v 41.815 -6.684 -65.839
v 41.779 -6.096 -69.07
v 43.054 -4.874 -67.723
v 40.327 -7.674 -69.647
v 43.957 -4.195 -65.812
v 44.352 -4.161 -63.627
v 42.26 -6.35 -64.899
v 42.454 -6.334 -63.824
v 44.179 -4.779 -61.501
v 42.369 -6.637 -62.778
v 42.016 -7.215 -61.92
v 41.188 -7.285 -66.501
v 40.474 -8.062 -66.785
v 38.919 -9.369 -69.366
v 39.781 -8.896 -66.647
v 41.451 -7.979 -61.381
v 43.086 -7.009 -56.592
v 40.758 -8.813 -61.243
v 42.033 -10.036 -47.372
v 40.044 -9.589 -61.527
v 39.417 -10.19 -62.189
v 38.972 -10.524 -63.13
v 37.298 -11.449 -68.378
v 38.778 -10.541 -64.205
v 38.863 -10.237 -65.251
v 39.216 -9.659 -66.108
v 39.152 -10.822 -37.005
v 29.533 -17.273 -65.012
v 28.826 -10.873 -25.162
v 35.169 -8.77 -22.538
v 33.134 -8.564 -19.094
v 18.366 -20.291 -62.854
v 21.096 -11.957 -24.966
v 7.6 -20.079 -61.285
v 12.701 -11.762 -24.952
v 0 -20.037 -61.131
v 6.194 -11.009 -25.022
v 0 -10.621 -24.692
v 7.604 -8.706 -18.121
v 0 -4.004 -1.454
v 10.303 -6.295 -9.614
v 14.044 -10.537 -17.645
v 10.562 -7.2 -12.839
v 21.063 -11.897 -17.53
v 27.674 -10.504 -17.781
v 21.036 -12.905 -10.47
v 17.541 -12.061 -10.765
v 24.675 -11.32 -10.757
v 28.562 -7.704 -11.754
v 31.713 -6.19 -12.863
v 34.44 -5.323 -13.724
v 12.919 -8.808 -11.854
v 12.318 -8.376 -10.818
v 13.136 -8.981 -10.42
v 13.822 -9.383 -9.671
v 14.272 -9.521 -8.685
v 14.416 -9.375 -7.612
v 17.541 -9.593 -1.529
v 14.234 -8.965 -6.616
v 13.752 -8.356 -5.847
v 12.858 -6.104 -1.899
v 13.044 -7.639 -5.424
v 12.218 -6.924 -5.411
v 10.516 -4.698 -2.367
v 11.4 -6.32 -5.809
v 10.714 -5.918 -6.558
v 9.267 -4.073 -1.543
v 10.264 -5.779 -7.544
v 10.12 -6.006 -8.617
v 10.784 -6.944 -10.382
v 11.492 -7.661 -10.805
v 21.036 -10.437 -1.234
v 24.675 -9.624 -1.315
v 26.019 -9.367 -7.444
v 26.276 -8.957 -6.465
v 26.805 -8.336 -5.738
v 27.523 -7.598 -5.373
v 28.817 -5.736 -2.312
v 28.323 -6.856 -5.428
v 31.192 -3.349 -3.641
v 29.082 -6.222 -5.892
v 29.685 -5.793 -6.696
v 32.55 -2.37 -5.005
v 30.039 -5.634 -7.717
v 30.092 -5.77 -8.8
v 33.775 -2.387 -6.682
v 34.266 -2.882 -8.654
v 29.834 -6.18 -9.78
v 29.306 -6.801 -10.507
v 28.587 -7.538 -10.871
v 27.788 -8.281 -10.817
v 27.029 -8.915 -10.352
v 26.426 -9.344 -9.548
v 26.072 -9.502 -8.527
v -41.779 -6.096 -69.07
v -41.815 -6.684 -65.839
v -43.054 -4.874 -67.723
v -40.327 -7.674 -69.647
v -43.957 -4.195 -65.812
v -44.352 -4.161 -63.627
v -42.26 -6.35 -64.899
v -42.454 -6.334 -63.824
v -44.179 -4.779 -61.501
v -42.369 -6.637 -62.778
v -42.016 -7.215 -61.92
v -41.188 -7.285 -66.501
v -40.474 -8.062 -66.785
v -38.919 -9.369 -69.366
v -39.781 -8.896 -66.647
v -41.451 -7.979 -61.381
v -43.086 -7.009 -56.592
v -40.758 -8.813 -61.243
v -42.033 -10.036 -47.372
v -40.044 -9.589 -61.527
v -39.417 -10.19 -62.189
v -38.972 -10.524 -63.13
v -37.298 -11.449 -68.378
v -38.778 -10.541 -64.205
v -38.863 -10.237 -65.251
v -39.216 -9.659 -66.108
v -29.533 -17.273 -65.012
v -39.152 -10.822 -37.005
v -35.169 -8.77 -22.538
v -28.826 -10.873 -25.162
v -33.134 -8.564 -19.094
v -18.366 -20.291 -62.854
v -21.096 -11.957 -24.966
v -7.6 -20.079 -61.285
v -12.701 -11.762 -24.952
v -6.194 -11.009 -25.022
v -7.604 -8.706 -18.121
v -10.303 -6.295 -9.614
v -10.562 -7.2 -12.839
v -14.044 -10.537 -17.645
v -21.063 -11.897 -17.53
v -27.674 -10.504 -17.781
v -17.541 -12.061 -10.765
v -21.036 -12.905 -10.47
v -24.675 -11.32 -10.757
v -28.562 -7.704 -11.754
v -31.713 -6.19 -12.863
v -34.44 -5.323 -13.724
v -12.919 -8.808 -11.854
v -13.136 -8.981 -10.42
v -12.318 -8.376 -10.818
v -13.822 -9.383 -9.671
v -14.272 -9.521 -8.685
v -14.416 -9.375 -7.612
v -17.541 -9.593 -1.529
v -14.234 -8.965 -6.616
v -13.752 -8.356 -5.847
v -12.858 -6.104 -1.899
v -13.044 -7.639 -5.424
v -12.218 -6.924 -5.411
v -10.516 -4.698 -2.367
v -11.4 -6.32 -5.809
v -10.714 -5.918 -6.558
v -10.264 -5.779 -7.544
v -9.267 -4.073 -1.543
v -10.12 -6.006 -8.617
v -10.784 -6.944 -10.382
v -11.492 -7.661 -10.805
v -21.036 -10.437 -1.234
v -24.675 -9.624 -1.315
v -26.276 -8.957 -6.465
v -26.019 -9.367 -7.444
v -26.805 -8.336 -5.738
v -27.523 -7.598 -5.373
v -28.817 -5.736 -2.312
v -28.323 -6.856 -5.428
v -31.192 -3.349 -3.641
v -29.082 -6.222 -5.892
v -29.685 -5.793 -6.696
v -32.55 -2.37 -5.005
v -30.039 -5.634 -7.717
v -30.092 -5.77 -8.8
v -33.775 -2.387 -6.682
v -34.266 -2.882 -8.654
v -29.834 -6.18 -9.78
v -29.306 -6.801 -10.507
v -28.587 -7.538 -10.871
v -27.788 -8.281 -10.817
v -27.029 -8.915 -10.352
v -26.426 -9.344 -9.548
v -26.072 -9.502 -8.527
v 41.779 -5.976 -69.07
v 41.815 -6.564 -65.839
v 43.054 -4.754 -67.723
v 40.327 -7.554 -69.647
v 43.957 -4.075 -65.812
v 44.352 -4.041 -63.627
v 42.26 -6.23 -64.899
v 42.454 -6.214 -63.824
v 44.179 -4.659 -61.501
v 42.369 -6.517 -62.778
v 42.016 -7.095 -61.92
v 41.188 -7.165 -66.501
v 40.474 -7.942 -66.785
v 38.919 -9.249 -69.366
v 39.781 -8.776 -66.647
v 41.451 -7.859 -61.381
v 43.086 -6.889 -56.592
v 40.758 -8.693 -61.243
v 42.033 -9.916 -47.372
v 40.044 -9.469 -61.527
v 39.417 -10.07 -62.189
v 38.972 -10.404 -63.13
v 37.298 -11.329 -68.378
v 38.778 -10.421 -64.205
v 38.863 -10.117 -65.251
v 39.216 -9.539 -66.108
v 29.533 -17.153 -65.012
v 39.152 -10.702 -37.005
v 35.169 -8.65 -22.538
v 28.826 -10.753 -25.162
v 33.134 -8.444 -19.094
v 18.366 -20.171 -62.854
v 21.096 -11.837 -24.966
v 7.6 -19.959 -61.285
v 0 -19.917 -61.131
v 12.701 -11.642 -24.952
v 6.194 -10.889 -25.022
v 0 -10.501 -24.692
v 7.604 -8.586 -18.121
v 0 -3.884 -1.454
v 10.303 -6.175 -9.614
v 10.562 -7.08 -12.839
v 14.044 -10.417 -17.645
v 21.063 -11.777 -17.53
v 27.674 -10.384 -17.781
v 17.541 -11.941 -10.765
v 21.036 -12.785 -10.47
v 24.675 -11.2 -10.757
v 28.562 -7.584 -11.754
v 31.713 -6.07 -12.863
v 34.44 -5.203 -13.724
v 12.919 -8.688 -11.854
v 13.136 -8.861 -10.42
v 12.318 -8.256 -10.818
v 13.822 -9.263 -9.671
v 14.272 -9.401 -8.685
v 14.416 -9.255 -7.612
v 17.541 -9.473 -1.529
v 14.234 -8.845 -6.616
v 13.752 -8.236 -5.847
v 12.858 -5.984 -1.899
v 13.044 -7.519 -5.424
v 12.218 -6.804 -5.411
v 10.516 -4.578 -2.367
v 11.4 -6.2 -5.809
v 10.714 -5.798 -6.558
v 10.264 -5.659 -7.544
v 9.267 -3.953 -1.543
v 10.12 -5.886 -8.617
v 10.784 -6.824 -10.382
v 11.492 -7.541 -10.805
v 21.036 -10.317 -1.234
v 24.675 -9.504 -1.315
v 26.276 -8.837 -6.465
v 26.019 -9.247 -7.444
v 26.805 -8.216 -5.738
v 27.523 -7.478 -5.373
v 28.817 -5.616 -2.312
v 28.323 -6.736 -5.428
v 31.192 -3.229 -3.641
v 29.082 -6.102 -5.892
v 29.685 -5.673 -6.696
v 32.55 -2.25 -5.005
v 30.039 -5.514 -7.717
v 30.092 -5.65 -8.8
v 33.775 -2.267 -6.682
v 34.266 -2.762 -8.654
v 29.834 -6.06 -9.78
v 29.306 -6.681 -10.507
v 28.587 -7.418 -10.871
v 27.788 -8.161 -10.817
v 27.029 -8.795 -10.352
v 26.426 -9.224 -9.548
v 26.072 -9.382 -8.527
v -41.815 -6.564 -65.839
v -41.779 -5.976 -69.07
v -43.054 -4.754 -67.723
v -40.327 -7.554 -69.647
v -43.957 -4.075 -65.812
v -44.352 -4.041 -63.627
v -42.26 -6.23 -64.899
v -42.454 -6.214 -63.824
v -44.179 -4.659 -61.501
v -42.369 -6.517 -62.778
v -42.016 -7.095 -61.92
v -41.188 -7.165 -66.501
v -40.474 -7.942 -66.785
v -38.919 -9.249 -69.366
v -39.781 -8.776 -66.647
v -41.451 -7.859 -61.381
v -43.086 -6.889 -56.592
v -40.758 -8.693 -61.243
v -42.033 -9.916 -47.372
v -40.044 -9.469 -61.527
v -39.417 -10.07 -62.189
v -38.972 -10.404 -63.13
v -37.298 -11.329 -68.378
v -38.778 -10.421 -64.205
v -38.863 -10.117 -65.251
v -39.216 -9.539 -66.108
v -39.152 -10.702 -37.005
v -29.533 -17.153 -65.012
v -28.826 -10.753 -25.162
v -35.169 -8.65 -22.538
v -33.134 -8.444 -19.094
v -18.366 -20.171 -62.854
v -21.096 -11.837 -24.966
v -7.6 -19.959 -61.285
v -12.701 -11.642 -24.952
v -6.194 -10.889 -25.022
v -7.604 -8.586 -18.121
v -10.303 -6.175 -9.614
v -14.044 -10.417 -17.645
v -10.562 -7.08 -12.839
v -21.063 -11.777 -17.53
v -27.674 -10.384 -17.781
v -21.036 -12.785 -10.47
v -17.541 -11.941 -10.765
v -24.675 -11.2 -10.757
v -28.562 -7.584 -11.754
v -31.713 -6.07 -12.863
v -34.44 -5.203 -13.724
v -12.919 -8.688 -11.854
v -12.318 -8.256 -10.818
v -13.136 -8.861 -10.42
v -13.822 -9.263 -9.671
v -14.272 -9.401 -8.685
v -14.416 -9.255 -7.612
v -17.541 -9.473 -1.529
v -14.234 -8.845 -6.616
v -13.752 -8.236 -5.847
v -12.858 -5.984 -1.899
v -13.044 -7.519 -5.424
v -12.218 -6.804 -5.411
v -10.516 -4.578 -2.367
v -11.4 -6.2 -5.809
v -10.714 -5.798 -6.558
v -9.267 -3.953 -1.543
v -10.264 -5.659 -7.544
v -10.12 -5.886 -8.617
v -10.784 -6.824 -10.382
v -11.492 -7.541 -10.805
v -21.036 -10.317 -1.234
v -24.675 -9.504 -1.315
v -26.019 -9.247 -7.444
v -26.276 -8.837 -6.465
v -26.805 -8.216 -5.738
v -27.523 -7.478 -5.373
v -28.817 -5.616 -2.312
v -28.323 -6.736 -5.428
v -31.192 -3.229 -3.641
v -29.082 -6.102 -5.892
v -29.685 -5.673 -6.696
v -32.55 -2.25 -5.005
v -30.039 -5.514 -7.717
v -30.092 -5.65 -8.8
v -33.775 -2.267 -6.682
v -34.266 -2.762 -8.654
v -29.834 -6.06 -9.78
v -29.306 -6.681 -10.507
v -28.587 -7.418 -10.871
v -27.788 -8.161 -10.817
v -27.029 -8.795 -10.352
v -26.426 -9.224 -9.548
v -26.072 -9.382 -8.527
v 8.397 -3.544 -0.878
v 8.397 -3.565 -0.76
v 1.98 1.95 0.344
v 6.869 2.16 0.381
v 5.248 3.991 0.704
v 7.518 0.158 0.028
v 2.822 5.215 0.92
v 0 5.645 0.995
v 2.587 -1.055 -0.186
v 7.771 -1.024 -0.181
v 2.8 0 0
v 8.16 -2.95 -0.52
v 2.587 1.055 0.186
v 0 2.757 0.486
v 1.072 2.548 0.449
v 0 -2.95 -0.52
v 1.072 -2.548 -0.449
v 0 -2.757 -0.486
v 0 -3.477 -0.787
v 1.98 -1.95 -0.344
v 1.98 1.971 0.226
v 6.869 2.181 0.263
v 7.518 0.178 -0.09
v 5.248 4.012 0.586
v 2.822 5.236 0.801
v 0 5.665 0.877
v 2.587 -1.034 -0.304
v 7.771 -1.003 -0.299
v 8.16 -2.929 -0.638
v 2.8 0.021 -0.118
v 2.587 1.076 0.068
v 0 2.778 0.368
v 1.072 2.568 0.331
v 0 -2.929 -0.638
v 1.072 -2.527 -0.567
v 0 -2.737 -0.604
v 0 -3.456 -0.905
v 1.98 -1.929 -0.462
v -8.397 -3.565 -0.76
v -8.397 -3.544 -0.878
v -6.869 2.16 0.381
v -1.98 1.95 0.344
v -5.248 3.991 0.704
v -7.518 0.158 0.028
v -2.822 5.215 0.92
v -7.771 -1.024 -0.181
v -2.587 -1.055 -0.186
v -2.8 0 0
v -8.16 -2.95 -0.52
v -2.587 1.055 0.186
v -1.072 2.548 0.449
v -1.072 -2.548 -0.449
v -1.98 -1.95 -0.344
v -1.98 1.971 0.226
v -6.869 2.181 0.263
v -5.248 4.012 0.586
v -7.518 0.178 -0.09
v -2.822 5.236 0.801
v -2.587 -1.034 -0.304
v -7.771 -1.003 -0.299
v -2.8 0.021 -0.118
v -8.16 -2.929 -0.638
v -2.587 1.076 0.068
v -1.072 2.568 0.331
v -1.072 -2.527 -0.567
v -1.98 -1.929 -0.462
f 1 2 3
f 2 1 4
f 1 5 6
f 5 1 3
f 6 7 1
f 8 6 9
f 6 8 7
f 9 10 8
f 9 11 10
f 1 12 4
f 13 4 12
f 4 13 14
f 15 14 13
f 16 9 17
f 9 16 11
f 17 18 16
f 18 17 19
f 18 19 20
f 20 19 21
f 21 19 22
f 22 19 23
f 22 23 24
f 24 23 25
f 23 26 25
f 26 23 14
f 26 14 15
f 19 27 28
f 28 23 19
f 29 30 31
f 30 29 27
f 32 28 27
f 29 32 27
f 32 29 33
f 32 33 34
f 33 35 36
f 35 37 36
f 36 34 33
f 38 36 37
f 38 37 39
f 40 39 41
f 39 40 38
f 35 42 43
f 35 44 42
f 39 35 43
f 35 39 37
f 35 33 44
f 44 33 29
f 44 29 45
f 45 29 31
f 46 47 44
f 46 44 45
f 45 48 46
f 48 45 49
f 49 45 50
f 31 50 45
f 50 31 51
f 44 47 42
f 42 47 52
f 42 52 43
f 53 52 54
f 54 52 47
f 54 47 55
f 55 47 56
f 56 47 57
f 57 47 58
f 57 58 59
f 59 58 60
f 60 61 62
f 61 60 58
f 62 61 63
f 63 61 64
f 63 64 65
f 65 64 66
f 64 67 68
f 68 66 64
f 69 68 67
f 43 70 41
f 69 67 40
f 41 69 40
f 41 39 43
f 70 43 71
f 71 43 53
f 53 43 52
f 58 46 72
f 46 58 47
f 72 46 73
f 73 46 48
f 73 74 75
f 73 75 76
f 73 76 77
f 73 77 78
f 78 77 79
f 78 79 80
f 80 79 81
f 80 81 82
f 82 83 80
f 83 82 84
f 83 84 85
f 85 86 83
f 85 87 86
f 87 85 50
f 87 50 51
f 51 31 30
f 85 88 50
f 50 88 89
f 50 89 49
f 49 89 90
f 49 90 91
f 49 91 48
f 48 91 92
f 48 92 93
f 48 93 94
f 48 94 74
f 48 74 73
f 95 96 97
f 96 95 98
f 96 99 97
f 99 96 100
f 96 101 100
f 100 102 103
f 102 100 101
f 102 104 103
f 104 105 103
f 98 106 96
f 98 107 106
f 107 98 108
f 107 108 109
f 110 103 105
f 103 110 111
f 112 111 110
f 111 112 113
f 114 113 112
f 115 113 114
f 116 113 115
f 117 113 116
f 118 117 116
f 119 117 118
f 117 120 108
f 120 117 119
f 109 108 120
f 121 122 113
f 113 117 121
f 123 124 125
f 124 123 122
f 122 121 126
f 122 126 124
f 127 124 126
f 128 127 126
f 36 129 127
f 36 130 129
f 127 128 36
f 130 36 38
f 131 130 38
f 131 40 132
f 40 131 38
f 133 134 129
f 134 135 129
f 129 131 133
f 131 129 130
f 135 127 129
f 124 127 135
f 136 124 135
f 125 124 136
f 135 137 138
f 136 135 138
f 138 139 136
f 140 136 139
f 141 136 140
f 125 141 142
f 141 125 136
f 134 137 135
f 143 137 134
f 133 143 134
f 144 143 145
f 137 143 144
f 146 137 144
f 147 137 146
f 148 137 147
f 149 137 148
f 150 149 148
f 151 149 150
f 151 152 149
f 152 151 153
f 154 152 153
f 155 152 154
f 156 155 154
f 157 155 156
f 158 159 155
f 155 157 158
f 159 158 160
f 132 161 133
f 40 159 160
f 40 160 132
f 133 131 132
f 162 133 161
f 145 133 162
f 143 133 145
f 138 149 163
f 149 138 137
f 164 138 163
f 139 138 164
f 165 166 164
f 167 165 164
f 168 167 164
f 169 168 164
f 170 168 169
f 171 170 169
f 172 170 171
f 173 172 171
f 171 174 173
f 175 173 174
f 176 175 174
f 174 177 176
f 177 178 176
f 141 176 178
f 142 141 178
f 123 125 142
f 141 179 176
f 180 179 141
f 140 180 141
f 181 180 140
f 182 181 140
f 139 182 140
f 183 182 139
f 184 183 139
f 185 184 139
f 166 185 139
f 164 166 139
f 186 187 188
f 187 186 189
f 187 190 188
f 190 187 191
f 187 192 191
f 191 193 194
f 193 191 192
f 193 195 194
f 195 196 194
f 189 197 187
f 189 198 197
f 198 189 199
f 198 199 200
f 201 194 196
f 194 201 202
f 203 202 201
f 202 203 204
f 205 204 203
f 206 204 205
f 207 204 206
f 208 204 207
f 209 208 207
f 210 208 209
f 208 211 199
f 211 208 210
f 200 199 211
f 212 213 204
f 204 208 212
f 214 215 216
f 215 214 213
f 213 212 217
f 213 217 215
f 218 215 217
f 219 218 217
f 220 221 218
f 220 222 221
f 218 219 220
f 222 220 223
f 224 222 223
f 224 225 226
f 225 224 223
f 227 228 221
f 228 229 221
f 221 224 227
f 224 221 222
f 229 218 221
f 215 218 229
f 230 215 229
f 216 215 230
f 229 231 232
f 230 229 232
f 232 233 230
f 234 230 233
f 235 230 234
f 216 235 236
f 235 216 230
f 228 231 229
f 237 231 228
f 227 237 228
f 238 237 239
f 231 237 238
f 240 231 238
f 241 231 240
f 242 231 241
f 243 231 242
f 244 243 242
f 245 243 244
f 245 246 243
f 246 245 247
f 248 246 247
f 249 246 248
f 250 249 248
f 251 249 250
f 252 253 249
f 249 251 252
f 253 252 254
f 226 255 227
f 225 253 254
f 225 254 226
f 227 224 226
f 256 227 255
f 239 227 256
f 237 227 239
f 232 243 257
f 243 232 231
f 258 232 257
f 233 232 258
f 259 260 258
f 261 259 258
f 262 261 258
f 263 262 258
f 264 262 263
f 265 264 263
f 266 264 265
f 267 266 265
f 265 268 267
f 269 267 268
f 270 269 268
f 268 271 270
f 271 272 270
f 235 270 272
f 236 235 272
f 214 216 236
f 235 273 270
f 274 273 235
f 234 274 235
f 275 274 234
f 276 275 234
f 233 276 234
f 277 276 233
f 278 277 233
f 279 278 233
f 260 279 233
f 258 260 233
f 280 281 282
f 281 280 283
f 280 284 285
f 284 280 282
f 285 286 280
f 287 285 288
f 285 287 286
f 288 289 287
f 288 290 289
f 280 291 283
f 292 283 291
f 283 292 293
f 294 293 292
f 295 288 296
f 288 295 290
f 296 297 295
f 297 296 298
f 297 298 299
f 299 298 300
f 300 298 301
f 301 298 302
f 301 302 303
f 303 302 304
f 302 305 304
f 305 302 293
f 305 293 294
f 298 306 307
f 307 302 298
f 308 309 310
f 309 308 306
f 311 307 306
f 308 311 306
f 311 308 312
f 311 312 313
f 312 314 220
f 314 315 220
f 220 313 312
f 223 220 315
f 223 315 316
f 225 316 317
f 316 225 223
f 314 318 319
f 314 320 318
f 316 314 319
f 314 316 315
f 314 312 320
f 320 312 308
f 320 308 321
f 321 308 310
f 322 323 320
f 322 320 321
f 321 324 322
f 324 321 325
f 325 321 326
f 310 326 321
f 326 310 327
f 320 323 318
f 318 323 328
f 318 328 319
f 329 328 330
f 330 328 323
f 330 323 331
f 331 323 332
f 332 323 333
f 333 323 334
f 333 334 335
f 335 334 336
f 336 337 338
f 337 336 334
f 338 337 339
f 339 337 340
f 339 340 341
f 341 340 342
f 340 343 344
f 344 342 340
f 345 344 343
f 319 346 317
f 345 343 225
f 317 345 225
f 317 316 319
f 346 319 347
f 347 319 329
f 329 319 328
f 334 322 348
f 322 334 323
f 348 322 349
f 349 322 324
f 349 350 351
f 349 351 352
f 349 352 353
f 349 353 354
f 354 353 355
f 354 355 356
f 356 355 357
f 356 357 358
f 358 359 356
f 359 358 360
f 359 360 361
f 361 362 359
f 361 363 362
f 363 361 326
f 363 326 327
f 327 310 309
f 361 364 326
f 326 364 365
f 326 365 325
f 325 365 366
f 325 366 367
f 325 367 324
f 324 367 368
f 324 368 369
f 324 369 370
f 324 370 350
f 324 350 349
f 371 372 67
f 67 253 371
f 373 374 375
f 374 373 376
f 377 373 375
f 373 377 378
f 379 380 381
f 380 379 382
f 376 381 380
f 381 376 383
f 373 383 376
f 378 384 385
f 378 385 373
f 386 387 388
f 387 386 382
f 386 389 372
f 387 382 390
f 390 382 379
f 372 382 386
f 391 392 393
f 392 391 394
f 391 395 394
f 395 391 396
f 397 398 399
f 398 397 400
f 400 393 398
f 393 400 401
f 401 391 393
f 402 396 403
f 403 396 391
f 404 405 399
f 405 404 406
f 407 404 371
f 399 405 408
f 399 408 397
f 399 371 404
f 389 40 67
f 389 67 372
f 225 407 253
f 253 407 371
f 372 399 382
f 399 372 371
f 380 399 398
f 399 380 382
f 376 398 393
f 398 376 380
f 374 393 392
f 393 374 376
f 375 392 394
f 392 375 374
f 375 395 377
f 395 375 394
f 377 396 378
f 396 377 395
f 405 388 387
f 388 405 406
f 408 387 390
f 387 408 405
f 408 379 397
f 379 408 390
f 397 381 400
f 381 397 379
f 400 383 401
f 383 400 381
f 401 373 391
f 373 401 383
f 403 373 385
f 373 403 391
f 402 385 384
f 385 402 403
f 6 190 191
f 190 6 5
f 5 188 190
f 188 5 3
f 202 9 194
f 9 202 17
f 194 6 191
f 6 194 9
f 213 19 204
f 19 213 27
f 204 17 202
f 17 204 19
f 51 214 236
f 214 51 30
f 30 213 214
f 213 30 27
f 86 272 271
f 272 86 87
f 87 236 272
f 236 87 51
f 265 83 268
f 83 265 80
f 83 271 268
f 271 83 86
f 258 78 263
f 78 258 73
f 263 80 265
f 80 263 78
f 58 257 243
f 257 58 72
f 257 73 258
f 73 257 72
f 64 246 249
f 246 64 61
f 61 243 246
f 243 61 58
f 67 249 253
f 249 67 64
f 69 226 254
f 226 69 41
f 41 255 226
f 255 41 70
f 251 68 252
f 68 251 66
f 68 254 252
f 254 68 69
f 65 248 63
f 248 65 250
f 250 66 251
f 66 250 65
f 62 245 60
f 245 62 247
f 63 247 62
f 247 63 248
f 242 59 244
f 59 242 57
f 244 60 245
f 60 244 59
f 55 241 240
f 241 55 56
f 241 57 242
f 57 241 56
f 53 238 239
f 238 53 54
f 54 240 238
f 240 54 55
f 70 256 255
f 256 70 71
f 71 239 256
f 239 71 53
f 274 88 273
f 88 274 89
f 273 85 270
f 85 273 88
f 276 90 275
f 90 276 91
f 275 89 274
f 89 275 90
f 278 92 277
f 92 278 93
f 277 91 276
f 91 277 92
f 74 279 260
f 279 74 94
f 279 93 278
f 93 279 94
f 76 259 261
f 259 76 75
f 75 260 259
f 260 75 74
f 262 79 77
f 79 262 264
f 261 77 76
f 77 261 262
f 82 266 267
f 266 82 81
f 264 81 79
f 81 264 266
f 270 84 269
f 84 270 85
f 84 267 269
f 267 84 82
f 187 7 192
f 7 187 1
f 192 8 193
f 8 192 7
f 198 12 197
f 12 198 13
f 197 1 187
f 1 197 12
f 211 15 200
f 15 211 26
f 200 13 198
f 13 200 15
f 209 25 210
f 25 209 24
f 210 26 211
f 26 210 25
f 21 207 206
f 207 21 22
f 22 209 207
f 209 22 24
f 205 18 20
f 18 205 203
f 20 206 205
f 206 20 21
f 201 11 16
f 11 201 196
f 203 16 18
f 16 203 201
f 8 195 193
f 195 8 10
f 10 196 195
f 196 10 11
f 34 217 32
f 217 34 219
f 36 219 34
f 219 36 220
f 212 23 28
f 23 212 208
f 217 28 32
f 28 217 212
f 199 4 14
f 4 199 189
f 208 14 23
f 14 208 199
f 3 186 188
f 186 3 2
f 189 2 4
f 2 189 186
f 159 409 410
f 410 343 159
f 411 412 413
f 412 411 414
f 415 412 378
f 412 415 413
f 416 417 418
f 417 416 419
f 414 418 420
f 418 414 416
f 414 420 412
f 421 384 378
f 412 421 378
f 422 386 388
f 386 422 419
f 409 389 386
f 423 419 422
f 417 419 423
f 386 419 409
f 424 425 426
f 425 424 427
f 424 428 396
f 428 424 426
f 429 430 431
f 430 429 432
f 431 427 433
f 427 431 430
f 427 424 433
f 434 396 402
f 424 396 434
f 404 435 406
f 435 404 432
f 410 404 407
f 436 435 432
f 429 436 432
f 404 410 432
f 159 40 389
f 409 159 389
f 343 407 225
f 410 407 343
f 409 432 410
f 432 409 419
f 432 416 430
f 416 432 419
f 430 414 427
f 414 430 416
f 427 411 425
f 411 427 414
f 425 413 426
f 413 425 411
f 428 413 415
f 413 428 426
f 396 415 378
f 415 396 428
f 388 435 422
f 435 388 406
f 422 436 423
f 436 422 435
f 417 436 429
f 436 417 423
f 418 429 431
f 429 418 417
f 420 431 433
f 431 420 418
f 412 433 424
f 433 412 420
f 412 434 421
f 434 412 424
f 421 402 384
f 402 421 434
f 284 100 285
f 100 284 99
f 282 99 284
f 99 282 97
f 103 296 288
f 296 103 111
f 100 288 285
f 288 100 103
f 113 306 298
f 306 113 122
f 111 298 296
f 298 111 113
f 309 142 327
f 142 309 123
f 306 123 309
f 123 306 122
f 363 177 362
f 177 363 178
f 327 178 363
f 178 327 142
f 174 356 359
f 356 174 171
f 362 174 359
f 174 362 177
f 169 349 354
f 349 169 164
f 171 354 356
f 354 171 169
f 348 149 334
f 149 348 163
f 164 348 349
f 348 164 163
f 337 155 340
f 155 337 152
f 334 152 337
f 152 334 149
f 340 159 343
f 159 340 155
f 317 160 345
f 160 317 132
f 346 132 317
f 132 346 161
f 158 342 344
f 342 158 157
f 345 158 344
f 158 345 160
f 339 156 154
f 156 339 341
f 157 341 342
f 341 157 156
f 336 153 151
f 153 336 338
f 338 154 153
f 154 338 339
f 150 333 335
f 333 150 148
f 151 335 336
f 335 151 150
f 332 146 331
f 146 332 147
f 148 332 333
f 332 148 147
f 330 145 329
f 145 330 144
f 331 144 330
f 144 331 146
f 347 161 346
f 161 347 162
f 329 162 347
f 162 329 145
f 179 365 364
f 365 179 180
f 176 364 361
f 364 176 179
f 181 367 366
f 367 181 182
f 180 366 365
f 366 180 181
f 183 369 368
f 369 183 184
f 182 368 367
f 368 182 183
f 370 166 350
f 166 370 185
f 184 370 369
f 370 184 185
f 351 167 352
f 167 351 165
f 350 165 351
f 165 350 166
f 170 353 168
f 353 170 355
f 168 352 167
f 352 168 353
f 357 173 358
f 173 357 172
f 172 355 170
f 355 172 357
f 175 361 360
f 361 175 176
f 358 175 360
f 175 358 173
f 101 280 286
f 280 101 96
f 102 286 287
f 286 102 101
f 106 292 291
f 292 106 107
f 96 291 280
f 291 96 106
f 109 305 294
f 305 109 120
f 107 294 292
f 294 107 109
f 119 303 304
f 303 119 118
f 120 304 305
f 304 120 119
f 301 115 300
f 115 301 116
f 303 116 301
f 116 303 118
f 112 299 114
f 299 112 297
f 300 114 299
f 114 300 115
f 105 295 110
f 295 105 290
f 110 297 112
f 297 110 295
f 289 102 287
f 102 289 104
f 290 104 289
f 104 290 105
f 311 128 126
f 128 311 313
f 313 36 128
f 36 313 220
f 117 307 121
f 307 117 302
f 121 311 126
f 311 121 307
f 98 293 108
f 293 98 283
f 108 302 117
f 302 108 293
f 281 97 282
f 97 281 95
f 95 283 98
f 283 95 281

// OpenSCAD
use <../lib.scad>
use <s/u767c03s01.scad>
use <s/u767c03s02.scad>
function ldraw_lib__u767c03() = [
// 0 Sail 12 x 10 Trapezoidal (Formed Shape 3)
// 0 Name: u767c03.dat
// 0 Author: Philippe Hurbain [Philo]
// 0 !LDRAW_ORG Part UPDATE 2026-05
// 0 !LICENSE Licensed under CC BY 4.0 : see CAreadme.txt
// 
// 0 !HELP Placement on mast:
// 0 !HELP 1 25 58 20 -19 0 0 1 0 -1 0 1 0 0 3849.dat
// 0 !HELP 1 25 0 362 20 1 0 0 0 1 0 0 0 1 2538d.dat
// 0 !HELP 1 25 0 146 -22 1 0 0 0 -1 0 0 0 -1 4623.dat
// 0 !HELP 1 25 -10 154 -22 0 0 -1 0 -1 0 -1 0 0 2555.dat
// 0 !HELP 1 25 -98 160 -22 0 1 0 0 0 -1 -1 0 0 4497.dat
// 0 !HELP 1 25 10 154 -22 0 0 1 0 -1 0 1 0 0 2555.dat
// 0 !HELP 1 25 98 160 -22 0 -1 0 0 0 1 -1 0 0 4497.dat
// 
// 0 BFC CERTIFY CCW
  [0,"BFC","CERTIFY"],
  [0,"BFC","CCW"],
// 
// 0 !CATEGORY Sheet Fabric
// 
// 0 !KEYWORDS set 6277
// 
// 0 !HISTORY 2026-05-31 [OrionP] Official Update 2026-05
// 
// 
// 1 16 0 0 0 1 0 0 0 1 0 0 0 1 s\u767c03s01.dat
  [1,16,0,0,0,1,0,0,0,1,0,0,0,1, ldraw_lib__s__u767c03s01()],
// 1 16 0 0 0 -1 0 0 0 1 0 0 0 1 s\u767c03s01.dat
  [1,16,0,0,0,-1,0,0,0,1,0,0,0,1, ldraw_lib__s__u767c03s01()],
// 0 BFC INVERTNEXT
  [0,"BFC","INVERTNEXT"],
// 1 16 0 0 .3 1 0 0 0 1 0 0 0 1 s\u767c03s01.dat
  [1,16,0,0,.3,1,0,0,0,1,0,0,0,1, ldraw_lib__s__u767c03s01()],
// 0 BFC INVERTNEXT
  [0,"BFC","INVERTNEXT"],
// 1 16 0 0 .3 -1 0 0 0 1 0 0 0 1 s\u767c03s01.dat
  [1,16,0,0,.3,-1,0,0,0,1,0,0,0,1, ldraw_lib__s__u767c03s01()],
// 
// 1 16 0 0 0 1 0 0 0 1 0 0 0 1 s\u767c03s02.dat
  [1,16,0,0,0,1,0,0,0,1,0,0,0,1, ldraw_lib__s__u767c03s02()],
// 1 16 0 0 0 -1 0 0 0 1 0 0 0 1 s\u767c03s02.dat
  [1,16,0,0,0,-1,0,0,0,1,0,0,0,1, ldraw_lib__s__u767c03s02()],
];
module ldraw_lib__u767c03(step=0, col=false, unit=2/5, alt=false, line=0.2, solid=!$preview)
    makepoly(ldraw_lib__u767c03(), step=step, col=col, unit=unit, alt=alt, line=line, solid=solid);
ldraw_lib__u767c03(line=0.2);
